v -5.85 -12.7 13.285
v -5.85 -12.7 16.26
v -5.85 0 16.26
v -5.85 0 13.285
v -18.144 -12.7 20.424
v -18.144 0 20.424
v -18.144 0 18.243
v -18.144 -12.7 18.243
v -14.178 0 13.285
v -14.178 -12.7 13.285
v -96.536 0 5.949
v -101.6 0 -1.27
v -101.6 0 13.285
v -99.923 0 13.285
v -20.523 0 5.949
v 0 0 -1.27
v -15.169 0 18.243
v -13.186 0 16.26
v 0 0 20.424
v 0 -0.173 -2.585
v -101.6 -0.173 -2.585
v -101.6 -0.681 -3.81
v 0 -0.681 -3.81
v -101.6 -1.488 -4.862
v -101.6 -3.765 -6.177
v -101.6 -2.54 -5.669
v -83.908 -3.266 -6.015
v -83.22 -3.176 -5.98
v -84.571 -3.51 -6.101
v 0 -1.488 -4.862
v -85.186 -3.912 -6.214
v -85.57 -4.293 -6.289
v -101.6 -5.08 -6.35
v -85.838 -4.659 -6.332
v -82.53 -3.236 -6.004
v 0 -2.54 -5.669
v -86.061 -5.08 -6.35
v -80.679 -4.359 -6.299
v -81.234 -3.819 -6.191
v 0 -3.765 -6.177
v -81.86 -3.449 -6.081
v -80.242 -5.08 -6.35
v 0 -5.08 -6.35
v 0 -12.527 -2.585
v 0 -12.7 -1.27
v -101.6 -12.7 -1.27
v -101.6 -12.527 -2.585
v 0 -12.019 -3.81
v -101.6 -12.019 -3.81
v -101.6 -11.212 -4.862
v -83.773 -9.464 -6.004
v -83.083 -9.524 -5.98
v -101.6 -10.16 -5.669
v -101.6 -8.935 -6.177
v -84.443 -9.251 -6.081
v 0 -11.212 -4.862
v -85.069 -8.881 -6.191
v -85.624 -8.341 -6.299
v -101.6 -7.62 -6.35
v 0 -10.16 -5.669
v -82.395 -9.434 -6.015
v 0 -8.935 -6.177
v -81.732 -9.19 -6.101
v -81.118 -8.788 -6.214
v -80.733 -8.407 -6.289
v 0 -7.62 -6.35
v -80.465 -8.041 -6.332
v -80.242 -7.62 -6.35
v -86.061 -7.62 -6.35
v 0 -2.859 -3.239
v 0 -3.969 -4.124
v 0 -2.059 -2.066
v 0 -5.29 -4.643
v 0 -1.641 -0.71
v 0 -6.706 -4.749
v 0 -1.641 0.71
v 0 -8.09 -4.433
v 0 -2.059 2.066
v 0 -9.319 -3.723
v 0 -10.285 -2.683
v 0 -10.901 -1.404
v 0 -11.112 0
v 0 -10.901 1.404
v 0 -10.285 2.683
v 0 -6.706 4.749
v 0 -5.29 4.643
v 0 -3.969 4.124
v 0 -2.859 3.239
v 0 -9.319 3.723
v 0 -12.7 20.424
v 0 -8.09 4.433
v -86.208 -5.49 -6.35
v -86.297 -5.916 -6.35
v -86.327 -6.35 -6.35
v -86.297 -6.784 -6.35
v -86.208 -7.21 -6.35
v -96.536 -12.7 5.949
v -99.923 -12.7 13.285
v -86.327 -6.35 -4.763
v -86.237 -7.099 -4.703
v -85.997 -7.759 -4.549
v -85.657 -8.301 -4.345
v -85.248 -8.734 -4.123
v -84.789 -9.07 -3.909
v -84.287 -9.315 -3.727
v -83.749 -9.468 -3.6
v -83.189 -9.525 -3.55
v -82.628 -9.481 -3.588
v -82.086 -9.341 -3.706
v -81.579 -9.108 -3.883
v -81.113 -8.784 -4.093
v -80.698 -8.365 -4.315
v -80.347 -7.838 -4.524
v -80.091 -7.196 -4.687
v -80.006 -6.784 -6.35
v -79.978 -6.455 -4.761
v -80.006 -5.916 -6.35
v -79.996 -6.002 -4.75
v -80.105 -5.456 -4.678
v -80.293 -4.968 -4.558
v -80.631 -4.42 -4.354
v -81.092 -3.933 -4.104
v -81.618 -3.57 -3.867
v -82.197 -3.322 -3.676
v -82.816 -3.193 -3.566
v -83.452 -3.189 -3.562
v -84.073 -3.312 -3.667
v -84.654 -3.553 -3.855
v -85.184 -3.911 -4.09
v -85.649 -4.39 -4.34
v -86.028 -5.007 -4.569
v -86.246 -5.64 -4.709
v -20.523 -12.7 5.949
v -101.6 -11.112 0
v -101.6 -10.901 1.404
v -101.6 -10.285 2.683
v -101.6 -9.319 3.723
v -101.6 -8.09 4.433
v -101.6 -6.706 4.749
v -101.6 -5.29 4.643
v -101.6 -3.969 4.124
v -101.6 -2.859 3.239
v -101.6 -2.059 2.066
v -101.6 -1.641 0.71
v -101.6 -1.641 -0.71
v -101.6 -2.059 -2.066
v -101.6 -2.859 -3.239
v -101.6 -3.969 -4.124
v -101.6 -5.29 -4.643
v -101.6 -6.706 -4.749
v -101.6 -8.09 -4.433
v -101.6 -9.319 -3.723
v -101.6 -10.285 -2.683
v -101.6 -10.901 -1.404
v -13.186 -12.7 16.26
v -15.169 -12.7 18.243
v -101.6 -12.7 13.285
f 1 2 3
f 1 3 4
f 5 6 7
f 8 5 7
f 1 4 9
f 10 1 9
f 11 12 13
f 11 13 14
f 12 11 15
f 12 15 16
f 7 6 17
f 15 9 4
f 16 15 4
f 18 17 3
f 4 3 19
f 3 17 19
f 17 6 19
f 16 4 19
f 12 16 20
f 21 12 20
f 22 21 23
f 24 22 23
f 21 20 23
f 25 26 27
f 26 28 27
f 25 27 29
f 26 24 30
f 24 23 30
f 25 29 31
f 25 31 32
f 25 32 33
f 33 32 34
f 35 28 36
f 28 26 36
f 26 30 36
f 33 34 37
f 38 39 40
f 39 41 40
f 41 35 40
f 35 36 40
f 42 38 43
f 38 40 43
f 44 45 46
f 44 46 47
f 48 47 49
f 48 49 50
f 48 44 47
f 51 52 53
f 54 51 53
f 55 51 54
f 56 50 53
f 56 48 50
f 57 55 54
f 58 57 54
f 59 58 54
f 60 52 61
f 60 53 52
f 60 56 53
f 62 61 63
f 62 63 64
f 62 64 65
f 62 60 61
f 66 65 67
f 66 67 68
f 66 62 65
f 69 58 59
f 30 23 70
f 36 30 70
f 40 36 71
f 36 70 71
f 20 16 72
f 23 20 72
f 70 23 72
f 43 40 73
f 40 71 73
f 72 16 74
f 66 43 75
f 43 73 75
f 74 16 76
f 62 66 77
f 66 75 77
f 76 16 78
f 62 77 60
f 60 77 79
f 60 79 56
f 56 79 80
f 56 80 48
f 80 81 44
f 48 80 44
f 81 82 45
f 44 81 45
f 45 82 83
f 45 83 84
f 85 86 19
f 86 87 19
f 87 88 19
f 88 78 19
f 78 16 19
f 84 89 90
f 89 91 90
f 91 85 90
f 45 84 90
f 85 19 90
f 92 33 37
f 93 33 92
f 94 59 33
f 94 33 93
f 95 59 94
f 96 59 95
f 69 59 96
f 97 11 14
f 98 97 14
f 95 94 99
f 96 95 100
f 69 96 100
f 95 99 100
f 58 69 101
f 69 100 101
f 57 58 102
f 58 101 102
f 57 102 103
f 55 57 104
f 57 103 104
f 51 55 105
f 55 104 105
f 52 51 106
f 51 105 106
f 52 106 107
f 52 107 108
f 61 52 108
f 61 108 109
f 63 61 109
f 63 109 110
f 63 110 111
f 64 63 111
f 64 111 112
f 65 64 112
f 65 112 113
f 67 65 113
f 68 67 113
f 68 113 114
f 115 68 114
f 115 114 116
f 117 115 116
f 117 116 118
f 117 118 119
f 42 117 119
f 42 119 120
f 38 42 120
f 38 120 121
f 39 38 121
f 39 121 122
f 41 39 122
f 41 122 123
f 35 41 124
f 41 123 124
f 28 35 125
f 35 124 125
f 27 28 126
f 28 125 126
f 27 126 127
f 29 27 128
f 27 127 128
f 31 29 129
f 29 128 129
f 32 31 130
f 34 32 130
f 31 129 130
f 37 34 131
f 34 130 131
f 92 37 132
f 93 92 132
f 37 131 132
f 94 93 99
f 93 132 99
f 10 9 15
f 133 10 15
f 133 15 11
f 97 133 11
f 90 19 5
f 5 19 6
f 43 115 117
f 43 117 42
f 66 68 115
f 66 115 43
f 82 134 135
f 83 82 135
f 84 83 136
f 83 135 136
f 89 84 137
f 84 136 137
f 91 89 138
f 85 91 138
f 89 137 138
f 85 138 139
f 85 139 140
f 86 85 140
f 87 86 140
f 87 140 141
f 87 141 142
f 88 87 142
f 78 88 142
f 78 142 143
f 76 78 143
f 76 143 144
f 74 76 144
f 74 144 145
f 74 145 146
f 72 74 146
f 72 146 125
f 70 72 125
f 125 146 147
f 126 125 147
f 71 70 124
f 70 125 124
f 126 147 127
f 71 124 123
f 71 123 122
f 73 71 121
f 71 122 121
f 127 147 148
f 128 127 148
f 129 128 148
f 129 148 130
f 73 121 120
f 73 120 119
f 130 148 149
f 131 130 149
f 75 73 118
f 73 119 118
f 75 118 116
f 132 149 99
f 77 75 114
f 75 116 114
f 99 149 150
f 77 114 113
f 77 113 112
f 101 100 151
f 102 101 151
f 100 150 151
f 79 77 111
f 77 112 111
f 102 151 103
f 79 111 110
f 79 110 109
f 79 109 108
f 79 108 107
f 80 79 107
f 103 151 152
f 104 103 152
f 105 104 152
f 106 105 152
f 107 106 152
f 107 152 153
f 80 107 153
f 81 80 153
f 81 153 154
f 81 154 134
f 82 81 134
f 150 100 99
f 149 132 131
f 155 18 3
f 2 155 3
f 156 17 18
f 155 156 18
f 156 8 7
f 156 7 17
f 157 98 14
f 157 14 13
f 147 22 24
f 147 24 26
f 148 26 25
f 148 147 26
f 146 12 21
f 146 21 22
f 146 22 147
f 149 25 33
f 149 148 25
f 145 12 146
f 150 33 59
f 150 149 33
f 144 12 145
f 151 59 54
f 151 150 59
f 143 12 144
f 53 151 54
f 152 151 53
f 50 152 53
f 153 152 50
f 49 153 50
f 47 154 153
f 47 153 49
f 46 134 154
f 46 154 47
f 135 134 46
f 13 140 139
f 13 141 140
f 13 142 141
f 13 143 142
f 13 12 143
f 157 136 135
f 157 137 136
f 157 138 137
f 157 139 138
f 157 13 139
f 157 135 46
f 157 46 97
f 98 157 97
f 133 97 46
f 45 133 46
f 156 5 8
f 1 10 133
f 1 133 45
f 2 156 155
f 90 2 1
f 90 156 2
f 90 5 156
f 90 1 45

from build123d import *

# Parameters (mm, degrees)
F1_DEPTH = 12.7
F2_W     = 101.6
F2_H     = 12.7
F3_DEPTH = 6.35
F4_R     = 5.08
F6_D     = 9.525
F8_D     = 6.35
F8_DEPTH = 5.08
F8_START = 0.3707141
F8_TIP   = 1.9077324654


with BuildPart() as f1:
    # F0 (on Front) → F1 (new body)
    with BuildSketch(Plane.XZ):
        Polygon((-101.6, 0), (0, 0), (0, 20.4238668084), (-18.1435327977, 20.4238668084), (-18.1435327977, 18.2426776737), (-15.169181861, 18.2426776737), (-13.1862824783, 16.259778291), (-5.8495542035, 16.259778291), (-5.8495542035, 13.2854273543), (-14.1777321696, 13.2854273543), (-20.5230116844, 5.9486986138), (-62.4783523381, 5.9486986138), (-96.535615623, 5.9486986138), (-99.9226495624, 13.2854273543), (-101.6, 13.2854273543), align=None)
    extrude(amount=F1_DEPTH)

    # F2 (on face) → F3 (join)
    with BuildSketch(Plane(origin=(0, 0, 0), x_dir=(1, 0, 0), z_dir=(0, 0, -1))):
        with Locations((-50.8, 6.35)):
            Rectangle(F2_W, F2_H)
    extrude(amount=F3_DEPTH)

    # F4
    f4_edges = [f1.edges().sort_by_distance(p)[0] for p in [
        (-50.8, -12.7, -6.35),
        (-50.8, 0, -6.35),
    ]]
    fillet(f4_edges, radius=F4_R)

    # F6 (through all)
    with Locations(Plane.YZ):
        with Locations((-6.35, 0)):
            Hole(F6_D / 2)

    # F8
    # its depths count from where the whole tool has entered the part; down to there all is cleared
    with Locations(Plane(origin=(0, 0, -6.35), x_dir=(1, 0, 0), z_dir=(0, 0, -1)).offset(-F8_START)):
        with Locations((-83.1515192986, 6.35)):
            Hole(F8_D / 2, depth=F8_DEPTH)
            with Locations((0, 0, -(F8_DEPTH + F8_TIP / 2))):  # 118° drill point
                Cone(0, F8_D / 2, F8_TIP, mode=Mode.SUBTRACT)


solid = f1.part
